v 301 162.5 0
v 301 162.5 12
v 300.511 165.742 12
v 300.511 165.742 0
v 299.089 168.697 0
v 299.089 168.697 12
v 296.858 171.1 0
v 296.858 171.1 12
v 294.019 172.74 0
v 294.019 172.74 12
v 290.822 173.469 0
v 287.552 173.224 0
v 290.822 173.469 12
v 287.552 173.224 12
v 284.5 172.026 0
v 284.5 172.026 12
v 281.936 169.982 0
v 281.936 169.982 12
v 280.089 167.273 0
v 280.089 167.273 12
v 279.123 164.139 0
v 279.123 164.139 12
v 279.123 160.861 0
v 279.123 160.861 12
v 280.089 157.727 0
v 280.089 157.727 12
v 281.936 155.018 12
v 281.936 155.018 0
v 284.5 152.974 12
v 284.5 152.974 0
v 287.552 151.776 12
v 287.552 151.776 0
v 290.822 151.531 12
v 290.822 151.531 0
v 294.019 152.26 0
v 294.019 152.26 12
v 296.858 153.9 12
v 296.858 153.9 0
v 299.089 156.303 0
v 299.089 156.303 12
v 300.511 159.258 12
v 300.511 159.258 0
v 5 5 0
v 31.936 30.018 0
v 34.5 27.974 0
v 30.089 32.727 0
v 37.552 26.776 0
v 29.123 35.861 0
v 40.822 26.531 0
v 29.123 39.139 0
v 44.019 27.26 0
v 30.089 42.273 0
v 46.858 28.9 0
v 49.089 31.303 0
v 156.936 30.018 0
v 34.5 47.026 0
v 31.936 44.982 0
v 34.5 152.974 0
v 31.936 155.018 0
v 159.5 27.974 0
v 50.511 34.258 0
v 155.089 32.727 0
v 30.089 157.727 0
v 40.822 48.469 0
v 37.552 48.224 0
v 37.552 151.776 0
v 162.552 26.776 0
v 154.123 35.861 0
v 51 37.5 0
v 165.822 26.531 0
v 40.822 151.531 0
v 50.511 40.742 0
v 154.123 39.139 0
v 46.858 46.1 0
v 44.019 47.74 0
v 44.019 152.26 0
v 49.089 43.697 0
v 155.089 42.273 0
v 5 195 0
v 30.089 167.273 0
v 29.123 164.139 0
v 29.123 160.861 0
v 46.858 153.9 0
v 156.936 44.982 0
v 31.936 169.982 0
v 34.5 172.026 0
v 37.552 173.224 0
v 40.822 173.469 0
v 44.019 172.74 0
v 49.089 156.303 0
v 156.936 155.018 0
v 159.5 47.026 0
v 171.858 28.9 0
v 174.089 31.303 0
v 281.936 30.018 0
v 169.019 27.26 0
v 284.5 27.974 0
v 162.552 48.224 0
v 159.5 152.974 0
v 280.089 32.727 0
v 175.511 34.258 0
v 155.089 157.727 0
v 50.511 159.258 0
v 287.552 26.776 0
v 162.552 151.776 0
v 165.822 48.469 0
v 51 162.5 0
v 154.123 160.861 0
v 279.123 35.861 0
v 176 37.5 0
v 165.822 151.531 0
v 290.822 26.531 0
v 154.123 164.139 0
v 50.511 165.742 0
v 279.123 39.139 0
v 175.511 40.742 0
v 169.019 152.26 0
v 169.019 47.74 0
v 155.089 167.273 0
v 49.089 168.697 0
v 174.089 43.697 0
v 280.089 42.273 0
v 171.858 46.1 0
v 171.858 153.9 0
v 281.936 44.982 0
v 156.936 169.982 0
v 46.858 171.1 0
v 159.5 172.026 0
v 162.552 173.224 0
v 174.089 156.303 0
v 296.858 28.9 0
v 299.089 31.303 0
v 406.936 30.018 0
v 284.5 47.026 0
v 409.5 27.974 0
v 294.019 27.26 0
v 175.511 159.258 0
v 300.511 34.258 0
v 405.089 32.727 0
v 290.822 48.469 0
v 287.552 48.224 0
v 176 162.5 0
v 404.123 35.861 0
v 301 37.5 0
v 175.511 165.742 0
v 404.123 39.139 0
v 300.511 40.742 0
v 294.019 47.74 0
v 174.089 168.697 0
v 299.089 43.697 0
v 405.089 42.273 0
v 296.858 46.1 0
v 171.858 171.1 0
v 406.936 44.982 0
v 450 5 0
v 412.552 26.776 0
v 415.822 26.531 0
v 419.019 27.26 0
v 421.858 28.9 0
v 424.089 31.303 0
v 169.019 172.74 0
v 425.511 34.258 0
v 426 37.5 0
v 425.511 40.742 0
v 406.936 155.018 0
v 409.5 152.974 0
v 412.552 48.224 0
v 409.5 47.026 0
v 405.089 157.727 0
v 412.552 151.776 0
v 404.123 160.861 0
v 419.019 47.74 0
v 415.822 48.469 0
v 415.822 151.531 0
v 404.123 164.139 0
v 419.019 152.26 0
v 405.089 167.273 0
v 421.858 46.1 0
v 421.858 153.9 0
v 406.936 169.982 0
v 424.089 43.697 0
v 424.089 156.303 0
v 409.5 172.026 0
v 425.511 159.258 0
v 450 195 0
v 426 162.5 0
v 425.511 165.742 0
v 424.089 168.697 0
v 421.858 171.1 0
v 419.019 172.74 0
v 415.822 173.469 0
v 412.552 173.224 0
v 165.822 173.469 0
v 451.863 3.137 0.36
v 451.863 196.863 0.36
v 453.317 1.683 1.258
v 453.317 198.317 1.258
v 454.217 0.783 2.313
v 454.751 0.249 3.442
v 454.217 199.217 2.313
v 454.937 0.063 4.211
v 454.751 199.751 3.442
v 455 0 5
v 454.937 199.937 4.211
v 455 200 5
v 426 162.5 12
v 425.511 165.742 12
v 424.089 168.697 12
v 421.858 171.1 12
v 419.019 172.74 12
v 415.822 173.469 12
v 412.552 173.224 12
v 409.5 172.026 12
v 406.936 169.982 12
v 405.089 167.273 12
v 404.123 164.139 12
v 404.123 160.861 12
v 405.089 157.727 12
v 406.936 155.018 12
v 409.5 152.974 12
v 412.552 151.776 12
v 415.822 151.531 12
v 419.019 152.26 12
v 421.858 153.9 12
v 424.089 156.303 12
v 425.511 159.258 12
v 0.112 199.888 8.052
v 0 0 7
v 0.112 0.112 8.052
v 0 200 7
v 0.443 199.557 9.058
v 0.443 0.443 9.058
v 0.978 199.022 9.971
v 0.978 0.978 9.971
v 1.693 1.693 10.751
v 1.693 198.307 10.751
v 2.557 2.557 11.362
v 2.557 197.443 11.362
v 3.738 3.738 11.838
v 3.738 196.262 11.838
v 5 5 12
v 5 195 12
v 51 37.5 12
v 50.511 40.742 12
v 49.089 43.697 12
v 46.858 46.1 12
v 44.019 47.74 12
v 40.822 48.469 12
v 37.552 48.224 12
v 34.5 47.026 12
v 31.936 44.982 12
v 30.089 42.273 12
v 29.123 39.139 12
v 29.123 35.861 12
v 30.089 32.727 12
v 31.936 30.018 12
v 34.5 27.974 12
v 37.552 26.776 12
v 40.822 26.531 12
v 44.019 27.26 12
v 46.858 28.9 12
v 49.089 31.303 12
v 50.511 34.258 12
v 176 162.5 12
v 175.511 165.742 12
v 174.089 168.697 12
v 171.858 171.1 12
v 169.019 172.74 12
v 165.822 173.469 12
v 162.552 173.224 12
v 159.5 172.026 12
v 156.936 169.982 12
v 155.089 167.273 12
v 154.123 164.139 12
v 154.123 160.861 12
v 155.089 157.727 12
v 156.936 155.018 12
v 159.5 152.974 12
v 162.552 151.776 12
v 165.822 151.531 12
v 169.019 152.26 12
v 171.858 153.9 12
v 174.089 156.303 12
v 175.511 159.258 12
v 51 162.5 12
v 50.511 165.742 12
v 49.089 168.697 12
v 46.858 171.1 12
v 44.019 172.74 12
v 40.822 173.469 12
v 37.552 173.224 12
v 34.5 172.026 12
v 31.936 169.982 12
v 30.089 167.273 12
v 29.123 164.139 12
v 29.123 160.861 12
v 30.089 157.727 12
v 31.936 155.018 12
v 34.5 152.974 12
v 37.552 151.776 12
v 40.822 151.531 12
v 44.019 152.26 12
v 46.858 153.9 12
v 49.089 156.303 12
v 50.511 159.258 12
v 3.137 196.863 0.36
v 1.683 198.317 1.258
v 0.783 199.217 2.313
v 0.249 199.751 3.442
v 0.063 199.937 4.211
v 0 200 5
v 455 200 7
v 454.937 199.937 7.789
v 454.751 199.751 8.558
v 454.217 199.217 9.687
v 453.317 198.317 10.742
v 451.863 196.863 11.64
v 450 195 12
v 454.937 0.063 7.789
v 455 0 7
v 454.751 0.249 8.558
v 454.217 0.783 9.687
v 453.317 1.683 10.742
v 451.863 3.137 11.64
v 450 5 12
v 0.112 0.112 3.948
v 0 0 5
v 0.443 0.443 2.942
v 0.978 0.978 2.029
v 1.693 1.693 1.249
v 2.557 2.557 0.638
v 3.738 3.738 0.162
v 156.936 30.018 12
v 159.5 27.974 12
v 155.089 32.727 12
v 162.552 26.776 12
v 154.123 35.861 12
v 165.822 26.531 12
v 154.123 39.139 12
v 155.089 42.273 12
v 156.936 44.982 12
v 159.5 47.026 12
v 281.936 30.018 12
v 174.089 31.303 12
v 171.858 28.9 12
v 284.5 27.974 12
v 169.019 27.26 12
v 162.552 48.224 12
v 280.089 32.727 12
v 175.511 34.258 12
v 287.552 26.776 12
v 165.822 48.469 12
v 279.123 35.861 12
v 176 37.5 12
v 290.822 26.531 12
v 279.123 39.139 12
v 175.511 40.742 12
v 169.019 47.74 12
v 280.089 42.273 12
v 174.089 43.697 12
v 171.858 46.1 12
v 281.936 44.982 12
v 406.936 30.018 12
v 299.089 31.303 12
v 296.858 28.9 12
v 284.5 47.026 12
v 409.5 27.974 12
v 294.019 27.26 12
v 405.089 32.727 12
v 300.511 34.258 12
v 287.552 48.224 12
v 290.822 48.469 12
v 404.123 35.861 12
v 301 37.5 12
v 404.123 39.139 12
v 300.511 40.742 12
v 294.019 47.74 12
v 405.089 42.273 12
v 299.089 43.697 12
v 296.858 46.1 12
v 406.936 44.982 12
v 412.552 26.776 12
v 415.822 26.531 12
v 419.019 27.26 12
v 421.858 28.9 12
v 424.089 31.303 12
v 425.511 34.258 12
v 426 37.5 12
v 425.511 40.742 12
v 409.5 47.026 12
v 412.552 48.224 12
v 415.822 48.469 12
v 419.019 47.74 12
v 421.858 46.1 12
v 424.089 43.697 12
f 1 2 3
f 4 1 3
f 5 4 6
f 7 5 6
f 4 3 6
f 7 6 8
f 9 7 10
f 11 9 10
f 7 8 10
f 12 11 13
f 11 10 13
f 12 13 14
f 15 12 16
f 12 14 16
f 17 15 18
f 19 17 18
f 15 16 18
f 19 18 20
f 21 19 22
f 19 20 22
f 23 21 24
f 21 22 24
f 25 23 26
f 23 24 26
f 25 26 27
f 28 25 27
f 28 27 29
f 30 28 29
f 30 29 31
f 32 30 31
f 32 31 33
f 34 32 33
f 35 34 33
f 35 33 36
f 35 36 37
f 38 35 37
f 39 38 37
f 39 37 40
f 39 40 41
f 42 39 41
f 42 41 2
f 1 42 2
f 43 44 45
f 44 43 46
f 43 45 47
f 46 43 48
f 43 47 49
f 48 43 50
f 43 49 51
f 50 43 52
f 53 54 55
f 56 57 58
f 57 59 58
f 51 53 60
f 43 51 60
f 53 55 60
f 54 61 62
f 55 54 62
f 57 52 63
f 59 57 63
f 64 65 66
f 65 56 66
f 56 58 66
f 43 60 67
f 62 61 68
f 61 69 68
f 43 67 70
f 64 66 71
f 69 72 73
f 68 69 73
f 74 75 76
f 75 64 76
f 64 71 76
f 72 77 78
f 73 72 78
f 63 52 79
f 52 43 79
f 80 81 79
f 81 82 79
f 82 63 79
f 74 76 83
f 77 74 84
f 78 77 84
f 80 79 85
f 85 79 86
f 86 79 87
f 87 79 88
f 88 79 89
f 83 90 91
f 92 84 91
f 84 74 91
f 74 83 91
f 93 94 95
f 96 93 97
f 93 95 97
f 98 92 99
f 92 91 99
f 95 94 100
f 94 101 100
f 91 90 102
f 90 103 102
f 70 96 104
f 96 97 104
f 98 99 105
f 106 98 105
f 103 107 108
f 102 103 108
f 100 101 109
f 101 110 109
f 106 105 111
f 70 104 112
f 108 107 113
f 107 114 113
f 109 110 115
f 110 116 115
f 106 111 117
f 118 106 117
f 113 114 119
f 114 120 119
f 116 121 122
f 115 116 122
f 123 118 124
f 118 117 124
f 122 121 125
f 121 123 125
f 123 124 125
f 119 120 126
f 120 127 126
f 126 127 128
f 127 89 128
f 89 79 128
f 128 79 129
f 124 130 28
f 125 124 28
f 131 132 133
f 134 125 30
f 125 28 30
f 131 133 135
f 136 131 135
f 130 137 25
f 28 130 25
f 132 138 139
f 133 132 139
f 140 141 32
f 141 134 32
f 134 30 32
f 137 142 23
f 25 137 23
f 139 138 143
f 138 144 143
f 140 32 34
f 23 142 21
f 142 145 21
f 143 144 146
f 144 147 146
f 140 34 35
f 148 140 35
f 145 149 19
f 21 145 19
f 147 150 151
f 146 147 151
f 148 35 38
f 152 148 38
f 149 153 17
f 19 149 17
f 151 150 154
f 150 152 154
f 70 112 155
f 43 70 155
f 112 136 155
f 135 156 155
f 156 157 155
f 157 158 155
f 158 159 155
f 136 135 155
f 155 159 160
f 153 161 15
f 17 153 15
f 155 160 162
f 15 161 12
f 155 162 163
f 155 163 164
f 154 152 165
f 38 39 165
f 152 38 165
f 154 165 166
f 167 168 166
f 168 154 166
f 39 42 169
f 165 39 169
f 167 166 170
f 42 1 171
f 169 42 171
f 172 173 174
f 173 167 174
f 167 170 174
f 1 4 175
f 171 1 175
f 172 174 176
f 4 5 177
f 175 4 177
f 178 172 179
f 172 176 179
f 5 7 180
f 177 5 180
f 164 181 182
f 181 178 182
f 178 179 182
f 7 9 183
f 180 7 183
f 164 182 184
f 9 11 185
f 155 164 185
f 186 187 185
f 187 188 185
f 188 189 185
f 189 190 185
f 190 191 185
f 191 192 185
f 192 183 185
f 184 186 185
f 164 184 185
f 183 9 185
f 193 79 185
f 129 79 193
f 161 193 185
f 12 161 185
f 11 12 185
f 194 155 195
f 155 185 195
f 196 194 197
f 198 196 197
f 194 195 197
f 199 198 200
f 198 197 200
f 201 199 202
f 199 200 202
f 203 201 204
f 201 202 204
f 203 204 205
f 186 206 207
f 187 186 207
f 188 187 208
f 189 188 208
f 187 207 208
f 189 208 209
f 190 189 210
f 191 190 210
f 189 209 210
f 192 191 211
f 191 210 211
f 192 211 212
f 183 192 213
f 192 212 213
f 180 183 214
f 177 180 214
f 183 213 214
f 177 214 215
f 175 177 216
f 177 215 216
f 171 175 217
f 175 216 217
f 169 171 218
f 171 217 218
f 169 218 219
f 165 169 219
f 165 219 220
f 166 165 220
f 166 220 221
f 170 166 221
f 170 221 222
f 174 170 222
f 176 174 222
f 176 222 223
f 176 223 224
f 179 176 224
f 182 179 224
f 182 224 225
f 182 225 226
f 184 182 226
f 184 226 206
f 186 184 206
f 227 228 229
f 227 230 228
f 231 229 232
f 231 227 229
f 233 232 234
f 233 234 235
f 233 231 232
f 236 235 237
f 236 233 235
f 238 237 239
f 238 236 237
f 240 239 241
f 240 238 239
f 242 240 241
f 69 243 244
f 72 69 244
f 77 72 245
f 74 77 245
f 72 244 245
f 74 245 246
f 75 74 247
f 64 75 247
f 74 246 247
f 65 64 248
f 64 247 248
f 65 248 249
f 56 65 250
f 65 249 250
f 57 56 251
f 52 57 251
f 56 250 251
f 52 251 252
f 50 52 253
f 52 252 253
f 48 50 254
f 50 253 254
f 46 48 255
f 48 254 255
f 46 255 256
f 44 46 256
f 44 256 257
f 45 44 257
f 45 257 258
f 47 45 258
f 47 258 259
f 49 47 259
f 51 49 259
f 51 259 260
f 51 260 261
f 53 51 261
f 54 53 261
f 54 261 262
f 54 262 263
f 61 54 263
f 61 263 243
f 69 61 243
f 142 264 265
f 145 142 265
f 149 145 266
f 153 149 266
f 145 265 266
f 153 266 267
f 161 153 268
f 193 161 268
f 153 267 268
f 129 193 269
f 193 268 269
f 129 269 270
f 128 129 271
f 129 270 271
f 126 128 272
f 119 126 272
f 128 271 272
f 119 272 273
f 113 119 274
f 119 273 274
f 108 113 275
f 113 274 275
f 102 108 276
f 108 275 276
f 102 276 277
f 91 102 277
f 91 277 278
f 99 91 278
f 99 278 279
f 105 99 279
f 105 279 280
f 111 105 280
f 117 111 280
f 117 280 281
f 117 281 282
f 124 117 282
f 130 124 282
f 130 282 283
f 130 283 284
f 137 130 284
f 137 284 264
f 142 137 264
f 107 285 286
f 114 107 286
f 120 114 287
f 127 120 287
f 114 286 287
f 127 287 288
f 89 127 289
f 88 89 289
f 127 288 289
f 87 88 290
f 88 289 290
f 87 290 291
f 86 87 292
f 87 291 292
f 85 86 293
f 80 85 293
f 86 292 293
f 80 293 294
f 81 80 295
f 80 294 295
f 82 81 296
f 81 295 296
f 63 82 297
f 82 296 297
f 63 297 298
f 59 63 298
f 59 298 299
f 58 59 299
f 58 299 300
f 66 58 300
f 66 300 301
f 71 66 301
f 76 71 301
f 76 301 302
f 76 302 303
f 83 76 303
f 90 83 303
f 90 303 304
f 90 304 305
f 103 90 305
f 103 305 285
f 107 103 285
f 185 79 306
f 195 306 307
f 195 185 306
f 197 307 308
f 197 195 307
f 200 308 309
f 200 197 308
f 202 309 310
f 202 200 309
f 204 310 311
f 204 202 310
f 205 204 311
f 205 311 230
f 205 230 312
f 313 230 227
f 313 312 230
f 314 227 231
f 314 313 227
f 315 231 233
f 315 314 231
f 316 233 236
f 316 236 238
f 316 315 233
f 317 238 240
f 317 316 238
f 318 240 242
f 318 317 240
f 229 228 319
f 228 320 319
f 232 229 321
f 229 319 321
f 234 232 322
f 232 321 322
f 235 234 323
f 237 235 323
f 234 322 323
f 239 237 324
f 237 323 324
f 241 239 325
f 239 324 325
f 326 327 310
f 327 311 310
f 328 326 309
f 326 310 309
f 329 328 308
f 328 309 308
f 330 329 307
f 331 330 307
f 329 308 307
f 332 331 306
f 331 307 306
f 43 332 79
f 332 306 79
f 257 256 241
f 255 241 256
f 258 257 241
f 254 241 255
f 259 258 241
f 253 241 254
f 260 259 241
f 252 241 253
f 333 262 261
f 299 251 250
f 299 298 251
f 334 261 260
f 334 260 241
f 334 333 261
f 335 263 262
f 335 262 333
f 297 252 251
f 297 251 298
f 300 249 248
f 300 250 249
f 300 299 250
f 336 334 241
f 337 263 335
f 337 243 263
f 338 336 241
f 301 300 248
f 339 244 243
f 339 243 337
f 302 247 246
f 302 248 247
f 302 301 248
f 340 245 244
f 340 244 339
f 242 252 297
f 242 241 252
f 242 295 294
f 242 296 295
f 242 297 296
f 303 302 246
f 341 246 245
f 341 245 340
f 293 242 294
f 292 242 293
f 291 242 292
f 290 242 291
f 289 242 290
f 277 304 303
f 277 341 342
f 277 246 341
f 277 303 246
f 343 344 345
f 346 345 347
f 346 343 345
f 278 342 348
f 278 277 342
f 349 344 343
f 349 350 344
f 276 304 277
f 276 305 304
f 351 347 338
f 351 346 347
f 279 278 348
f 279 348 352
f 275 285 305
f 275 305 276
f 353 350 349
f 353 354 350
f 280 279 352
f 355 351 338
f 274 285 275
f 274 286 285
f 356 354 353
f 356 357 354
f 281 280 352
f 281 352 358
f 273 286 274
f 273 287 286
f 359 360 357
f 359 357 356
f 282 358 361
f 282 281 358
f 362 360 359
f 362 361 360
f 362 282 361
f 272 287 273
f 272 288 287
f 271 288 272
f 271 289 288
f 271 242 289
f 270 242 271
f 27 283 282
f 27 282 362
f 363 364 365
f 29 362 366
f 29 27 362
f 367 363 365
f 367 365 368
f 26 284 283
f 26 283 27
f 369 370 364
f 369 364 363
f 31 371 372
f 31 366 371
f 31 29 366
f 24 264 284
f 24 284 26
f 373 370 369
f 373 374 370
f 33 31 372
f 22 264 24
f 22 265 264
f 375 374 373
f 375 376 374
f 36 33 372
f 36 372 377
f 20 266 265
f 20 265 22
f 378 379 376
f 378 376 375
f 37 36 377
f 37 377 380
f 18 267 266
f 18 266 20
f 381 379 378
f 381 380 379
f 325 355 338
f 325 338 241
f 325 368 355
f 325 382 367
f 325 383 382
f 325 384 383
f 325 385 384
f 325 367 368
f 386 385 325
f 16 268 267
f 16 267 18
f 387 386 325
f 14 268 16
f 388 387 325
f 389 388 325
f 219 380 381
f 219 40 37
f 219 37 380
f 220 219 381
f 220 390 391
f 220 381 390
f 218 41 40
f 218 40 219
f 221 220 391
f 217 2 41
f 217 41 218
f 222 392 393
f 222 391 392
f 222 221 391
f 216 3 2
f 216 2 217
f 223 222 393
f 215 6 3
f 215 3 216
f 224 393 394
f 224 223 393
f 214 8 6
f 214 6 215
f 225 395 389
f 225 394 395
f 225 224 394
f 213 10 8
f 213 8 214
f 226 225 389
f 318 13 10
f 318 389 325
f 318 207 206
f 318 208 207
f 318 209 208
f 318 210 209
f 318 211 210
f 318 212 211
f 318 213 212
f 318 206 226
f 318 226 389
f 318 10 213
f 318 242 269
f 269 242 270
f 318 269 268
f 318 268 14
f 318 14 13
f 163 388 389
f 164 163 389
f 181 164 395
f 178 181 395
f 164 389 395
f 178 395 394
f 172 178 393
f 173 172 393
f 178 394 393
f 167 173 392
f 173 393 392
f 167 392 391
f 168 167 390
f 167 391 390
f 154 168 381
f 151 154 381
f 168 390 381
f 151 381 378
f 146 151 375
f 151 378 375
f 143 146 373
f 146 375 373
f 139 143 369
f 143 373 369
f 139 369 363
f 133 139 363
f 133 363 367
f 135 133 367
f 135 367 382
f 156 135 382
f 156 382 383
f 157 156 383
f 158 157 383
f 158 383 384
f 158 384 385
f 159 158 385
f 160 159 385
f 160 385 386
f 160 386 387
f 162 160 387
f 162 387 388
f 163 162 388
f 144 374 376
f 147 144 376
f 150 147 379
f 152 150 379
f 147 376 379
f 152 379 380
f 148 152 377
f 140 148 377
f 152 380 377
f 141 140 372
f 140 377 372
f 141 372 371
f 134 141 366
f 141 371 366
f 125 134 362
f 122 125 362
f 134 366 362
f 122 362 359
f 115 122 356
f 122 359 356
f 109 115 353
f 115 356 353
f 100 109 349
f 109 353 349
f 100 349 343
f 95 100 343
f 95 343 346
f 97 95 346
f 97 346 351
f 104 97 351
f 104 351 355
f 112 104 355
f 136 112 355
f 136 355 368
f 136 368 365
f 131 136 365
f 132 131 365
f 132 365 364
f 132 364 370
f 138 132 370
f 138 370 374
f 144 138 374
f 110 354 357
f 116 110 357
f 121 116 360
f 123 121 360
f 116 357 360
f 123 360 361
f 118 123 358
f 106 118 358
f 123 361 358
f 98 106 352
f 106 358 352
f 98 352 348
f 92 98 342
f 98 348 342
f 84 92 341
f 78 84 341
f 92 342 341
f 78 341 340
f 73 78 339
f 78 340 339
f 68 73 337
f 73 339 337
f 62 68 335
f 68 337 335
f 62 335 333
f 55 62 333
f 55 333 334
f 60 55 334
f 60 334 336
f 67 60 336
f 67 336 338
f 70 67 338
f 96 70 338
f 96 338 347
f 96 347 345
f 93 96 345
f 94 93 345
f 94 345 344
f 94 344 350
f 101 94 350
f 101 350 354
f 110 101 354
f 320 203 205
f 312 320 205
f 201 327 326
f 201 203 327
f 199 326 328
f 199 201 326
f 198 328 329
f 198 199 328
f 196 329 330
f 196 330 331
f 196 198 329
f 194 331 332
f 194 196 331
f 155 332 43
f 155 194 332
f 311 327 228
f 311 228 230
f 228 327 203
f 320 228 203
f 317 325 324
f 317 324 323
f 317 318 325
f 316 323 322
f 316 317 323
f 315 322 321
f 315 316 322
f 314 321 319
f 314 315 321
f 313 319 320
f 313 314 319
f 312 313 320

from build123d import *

# Parameters (mm, degrees)
SKETCH_1_W                  = 455
SKETCH_1_H                  = 200
EXTRUDE_1_DEPTH             = 12
SKETCH_2_R                  = 11
CUT_EXTRUDE_2_DEPTH         = 498.160939737
PATTERN_LINEAR_1_COUNT      = 4
PATTERN_LINEAR_1_PITCH      = 125
PATTERN_LINEAR_1_COUNT_DIR2 = 2
PATTERN_LINEAR_1_PITCH_DIR2 = 125
FILLET_1_R                  = 5
FILLET_2_R                  = 5


with BuildPart() as part:
    # 草图1 → 拉伸1 (new body)
    with BuildSketch(Plane.XY):
        with Locations((227.5, 100)):
            Rectangle(SKETCH_1_W, SKETCH_1_H)
    extrude(amount=EXTRUDE_1_DEPTH)

    # 草图2 → 拉伸2 (cut, through all)
    with BuildSketch(Plane.XY.offset(12)):
        with Locations((40, 37.5)):
            Circle(SKETCH_2_R)
    cut_extrude_2 = extrude(amount=-CUT_EXTRUDE_2_DEPTH, mode=Mode.SUBTRACT)

    # 阵列(线性)1: Cut-Extrude 2 4 × 2
    with Locations(*[(i * PATTERN_LINEAR_1_PITCH, j * PATTERN_LINEAR_1_PITCH_DIR2, 0) for i in range(PATTERN_LINEAR_1_COUNT) for j in range(PATTERN_LINEAR_1_COUNT_DIR2) if (i, j) != (0, 0)]):
        add(cut_extrude_2, mode=Mode.SUBTRACT)

    # 圆角1
    fillet_1_edges = [part.edges().sort_by_distance(p)[0] for p in [
        (455, 100, 12),
        (227.5, 200, 12),
        (0, 100, 12),
        (227.5, 0, 12),
    ]]
    fillet(fillet_1_edges, radius=FILLET_1_R)

    # 圆角2
    fillet_2_edges = [part.edges().sort_by_distance(p)[0] for p in [
        (227.5, 200, 0),
        (455, 100, 0),
        (227.5, 0, 0),
        (0, 100, 0),
    ]]
    fillet(fillet_2_edges, radius=FILLET_2_R)


solid = part.part
